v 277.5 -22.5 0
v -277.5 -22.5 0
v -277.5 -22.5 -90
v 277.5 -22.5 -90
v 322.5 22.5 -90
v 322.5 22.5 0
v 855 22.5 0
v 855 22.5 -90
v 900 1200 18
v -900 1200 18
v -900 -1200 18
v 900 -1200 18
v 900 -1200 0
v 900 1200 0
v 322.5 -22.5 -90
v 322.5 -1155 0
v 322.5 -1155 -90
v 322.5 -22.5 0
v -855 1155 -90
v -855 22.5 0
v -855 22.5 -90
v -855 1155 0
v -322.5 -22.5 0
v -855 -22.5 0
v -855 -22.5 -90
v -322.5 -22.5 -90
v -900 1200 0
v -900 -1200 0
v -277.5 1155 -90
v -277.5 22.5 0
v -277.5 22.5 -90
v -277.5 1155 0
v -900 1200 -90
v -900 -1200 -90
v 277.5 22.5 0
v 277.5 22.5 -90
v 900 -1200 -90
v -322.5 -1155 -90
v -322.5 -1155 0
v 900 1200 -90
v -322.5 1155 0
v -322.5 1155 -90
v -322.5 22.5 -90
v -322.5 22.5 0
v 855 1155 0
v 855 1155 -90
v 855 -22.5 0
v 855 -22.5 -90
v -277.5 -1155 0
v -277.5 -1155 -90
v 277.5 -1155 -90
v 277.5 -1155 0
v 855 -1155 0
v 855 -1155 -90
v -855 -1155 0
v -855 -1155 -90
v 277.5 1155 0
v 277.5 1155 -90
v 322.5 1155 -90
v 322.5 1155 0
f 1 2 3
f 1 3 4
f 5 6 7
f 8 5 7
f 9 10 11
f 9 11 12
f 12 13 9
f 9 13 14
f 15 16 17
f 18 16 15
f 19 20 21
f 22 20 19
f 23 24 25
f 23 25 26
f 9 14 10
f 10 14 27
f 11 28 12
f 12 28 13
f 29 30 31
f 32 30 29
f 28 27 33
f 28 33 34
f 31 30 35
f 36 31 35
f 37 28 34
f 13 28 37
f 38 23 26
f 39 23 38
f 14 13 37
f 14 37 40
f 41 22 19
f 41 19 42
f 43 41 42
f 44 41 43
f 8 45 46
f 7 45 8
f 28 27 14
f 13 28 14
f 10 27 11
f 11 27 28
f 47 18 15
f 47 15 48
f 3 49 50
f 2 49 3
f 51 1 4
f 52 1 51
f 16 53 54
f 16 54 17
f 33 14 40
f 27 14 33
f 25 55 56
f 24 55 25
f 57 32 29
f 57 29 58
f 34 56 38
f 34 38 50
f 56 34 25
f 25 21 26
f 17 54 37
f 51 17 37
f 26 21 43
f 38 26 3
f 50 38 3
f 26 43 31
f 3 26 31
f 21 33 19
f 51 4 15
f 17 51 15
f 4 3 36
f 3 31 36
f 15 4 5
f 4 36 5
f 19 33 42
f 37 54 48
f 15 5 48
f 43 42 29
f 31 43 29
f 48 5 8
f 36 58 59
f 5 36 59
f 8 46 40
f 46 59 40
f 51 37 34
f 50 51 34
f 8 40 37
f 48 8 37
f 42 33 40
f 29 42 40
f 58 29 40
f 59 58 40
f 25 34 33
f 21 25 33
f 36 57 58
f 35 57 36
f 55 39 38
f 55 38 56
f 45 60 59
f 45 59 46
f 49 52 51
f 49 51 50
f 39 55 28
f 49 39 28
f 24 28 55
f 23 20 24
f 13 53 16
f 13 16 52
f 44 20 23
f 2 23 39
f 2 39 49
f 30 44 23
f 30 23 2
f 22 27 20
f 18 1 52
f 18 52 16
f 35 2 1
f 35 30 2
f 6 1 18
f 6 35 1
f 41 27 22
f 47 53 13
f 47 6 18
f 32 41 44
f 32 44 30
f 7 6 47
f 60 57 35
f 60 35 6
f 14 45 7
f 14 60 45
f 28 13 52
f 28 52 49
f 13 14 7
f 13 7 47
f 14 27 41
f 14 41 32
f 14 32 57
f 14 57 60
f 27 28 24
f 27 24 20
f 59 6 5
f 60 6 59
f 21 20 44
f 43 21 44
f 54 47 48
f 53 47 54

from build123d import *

# Parameters (mm, degrees)
F0_W     = 532.5
F0_H     = 45
F0_W_2   = 555
F1_DEPTH = 90
F0_H_2   = 1132.5
F2_DEPTH = 18


with BuildPart() as f1:
    # F0 (on Top) → F1 (new body)
    with BuildSketch(Plane.XY):
        Polygon((277.5, -1155), (322.5, -1155), (322.5, -22.5), (322.5, 22.5), (322.5, 1155), (277.5, 1155), (277.5, 22.5), (277.5, -22.5), align=None)
        with Locations((588.75, 0)):
            Rectangle(F0_W, F0_H)
        Rectangle(F0_W_2, F0_H)
        with Locations((-588.75, 0)):
            Rectangle(F0_W, F0_H)
        Polygon((-322.5, -22.5), (-322.5, -1155), (-277.5, -1155), (-277.5, -22.5), (-277.5, 22.5), (-277.5, 1155), (-322.5, 1155), (-322.5, 22.5), align=None)
        Polygon((-900, 1155), (-900, -1155), (-855, -1155), (-855, -22.5), (-855, 22.5), (-855, 1155), align=None)
        Polygon((855, -1155), (900, -1155), (900, 1155), (855, 1155), (855, 22.5), (855, -22.5), align=None)
        Polygon((-900, -1200), (900, -1200), (900, -1155), (855, -1155), (322.5, -1155), (277.5, -1155), (-277.5, -1155), (-322.5, -1155), (-855, -1155), (-900, -1155), align=None)
        Polygon((855, 1155), (900, 1155), (900, 1200), (-900, 1200), (-900, 1155), (-855, 1155), (-322.5, 1155), (-277.5, 1155), (277.5, 1155), (322.5, 1155), align=None)
    extrude(amount=-F1_DEPTH)


with BuildPart() as f2:
    # F0 (on Top) → F2 (new body)
    with BuildSketch(Plane.XY):
        with Locations((588.75, 588.75)):
            Rectangle(F0_W, F0_H_2)
        with Locations((588.75, -588.75)):
            Rectangle(F0_W, F0_H_2)
        with Locations((-588.75, -588.75)):
            Rectangle(F0_W, F0_H_2)
        with Locations((-588.75, 0)):
            Rectangle(F0_W, F0_H)
        with Locations((588.75, 0)):
            Rectangle(F0_W, F0_H)
        Polygon((855, -1155), (900, -1155), (900, 1155), (855, 1155), (855, 22.5), (855, -22.5), align=None)
        Polygon((855, 1155), (900, 1155), (900, 1200), (-900, 1200), (-900, 1155), (-855, 1155), (-322.5, 1155), (-277.5, 1155), (277.5, 1155), (322.5, 1155), align=None)
        Polygon((-900, 1155), (-900, -1155), (-855, -1155), (-855, -22.5), (-855, 22.5), (-855, 1155), align=None)
        Polygon((-900, -1200), (900, -1200), (900, -1155), (855, -1155), (322.5, -1155), (277.5, -1155), (-277.5, -1155), (-322.5, -1155), (-855, -1155), (-900, -1155), align=None)
        with Locations((0, -588.75)):
            Rectangle(F0_W_2, F0_H_2)
        with Locations((0, 588.75)):
            Rectangle(F0_W_2, F0_H_2)
        with Locations((-588.75, 588.75)):
            Rectangle(F0_W, F0_H_2)
        Rectangle(F0_W_2, F0_H)
        Polygon((-322.5, -22.5), (-322.5, -1155), (-277.5, -1155), (-277.5, -22.5), (-277.5, 22.5), (-277.5, 1155), (-322.5, 1155), (-322.5, 22.5), align=None)
        Polygon((277.5, -1155), (322.5, -1155), (322.5, -22.5), (322.5, 22.5), (322.5, 1155), (277.5, 1155), (277.5, 22.5), (277.5, -22.5), align=None)
    extrude(amount=F2_DEPTH)


solid = Compound([f1.part, f2.part])
